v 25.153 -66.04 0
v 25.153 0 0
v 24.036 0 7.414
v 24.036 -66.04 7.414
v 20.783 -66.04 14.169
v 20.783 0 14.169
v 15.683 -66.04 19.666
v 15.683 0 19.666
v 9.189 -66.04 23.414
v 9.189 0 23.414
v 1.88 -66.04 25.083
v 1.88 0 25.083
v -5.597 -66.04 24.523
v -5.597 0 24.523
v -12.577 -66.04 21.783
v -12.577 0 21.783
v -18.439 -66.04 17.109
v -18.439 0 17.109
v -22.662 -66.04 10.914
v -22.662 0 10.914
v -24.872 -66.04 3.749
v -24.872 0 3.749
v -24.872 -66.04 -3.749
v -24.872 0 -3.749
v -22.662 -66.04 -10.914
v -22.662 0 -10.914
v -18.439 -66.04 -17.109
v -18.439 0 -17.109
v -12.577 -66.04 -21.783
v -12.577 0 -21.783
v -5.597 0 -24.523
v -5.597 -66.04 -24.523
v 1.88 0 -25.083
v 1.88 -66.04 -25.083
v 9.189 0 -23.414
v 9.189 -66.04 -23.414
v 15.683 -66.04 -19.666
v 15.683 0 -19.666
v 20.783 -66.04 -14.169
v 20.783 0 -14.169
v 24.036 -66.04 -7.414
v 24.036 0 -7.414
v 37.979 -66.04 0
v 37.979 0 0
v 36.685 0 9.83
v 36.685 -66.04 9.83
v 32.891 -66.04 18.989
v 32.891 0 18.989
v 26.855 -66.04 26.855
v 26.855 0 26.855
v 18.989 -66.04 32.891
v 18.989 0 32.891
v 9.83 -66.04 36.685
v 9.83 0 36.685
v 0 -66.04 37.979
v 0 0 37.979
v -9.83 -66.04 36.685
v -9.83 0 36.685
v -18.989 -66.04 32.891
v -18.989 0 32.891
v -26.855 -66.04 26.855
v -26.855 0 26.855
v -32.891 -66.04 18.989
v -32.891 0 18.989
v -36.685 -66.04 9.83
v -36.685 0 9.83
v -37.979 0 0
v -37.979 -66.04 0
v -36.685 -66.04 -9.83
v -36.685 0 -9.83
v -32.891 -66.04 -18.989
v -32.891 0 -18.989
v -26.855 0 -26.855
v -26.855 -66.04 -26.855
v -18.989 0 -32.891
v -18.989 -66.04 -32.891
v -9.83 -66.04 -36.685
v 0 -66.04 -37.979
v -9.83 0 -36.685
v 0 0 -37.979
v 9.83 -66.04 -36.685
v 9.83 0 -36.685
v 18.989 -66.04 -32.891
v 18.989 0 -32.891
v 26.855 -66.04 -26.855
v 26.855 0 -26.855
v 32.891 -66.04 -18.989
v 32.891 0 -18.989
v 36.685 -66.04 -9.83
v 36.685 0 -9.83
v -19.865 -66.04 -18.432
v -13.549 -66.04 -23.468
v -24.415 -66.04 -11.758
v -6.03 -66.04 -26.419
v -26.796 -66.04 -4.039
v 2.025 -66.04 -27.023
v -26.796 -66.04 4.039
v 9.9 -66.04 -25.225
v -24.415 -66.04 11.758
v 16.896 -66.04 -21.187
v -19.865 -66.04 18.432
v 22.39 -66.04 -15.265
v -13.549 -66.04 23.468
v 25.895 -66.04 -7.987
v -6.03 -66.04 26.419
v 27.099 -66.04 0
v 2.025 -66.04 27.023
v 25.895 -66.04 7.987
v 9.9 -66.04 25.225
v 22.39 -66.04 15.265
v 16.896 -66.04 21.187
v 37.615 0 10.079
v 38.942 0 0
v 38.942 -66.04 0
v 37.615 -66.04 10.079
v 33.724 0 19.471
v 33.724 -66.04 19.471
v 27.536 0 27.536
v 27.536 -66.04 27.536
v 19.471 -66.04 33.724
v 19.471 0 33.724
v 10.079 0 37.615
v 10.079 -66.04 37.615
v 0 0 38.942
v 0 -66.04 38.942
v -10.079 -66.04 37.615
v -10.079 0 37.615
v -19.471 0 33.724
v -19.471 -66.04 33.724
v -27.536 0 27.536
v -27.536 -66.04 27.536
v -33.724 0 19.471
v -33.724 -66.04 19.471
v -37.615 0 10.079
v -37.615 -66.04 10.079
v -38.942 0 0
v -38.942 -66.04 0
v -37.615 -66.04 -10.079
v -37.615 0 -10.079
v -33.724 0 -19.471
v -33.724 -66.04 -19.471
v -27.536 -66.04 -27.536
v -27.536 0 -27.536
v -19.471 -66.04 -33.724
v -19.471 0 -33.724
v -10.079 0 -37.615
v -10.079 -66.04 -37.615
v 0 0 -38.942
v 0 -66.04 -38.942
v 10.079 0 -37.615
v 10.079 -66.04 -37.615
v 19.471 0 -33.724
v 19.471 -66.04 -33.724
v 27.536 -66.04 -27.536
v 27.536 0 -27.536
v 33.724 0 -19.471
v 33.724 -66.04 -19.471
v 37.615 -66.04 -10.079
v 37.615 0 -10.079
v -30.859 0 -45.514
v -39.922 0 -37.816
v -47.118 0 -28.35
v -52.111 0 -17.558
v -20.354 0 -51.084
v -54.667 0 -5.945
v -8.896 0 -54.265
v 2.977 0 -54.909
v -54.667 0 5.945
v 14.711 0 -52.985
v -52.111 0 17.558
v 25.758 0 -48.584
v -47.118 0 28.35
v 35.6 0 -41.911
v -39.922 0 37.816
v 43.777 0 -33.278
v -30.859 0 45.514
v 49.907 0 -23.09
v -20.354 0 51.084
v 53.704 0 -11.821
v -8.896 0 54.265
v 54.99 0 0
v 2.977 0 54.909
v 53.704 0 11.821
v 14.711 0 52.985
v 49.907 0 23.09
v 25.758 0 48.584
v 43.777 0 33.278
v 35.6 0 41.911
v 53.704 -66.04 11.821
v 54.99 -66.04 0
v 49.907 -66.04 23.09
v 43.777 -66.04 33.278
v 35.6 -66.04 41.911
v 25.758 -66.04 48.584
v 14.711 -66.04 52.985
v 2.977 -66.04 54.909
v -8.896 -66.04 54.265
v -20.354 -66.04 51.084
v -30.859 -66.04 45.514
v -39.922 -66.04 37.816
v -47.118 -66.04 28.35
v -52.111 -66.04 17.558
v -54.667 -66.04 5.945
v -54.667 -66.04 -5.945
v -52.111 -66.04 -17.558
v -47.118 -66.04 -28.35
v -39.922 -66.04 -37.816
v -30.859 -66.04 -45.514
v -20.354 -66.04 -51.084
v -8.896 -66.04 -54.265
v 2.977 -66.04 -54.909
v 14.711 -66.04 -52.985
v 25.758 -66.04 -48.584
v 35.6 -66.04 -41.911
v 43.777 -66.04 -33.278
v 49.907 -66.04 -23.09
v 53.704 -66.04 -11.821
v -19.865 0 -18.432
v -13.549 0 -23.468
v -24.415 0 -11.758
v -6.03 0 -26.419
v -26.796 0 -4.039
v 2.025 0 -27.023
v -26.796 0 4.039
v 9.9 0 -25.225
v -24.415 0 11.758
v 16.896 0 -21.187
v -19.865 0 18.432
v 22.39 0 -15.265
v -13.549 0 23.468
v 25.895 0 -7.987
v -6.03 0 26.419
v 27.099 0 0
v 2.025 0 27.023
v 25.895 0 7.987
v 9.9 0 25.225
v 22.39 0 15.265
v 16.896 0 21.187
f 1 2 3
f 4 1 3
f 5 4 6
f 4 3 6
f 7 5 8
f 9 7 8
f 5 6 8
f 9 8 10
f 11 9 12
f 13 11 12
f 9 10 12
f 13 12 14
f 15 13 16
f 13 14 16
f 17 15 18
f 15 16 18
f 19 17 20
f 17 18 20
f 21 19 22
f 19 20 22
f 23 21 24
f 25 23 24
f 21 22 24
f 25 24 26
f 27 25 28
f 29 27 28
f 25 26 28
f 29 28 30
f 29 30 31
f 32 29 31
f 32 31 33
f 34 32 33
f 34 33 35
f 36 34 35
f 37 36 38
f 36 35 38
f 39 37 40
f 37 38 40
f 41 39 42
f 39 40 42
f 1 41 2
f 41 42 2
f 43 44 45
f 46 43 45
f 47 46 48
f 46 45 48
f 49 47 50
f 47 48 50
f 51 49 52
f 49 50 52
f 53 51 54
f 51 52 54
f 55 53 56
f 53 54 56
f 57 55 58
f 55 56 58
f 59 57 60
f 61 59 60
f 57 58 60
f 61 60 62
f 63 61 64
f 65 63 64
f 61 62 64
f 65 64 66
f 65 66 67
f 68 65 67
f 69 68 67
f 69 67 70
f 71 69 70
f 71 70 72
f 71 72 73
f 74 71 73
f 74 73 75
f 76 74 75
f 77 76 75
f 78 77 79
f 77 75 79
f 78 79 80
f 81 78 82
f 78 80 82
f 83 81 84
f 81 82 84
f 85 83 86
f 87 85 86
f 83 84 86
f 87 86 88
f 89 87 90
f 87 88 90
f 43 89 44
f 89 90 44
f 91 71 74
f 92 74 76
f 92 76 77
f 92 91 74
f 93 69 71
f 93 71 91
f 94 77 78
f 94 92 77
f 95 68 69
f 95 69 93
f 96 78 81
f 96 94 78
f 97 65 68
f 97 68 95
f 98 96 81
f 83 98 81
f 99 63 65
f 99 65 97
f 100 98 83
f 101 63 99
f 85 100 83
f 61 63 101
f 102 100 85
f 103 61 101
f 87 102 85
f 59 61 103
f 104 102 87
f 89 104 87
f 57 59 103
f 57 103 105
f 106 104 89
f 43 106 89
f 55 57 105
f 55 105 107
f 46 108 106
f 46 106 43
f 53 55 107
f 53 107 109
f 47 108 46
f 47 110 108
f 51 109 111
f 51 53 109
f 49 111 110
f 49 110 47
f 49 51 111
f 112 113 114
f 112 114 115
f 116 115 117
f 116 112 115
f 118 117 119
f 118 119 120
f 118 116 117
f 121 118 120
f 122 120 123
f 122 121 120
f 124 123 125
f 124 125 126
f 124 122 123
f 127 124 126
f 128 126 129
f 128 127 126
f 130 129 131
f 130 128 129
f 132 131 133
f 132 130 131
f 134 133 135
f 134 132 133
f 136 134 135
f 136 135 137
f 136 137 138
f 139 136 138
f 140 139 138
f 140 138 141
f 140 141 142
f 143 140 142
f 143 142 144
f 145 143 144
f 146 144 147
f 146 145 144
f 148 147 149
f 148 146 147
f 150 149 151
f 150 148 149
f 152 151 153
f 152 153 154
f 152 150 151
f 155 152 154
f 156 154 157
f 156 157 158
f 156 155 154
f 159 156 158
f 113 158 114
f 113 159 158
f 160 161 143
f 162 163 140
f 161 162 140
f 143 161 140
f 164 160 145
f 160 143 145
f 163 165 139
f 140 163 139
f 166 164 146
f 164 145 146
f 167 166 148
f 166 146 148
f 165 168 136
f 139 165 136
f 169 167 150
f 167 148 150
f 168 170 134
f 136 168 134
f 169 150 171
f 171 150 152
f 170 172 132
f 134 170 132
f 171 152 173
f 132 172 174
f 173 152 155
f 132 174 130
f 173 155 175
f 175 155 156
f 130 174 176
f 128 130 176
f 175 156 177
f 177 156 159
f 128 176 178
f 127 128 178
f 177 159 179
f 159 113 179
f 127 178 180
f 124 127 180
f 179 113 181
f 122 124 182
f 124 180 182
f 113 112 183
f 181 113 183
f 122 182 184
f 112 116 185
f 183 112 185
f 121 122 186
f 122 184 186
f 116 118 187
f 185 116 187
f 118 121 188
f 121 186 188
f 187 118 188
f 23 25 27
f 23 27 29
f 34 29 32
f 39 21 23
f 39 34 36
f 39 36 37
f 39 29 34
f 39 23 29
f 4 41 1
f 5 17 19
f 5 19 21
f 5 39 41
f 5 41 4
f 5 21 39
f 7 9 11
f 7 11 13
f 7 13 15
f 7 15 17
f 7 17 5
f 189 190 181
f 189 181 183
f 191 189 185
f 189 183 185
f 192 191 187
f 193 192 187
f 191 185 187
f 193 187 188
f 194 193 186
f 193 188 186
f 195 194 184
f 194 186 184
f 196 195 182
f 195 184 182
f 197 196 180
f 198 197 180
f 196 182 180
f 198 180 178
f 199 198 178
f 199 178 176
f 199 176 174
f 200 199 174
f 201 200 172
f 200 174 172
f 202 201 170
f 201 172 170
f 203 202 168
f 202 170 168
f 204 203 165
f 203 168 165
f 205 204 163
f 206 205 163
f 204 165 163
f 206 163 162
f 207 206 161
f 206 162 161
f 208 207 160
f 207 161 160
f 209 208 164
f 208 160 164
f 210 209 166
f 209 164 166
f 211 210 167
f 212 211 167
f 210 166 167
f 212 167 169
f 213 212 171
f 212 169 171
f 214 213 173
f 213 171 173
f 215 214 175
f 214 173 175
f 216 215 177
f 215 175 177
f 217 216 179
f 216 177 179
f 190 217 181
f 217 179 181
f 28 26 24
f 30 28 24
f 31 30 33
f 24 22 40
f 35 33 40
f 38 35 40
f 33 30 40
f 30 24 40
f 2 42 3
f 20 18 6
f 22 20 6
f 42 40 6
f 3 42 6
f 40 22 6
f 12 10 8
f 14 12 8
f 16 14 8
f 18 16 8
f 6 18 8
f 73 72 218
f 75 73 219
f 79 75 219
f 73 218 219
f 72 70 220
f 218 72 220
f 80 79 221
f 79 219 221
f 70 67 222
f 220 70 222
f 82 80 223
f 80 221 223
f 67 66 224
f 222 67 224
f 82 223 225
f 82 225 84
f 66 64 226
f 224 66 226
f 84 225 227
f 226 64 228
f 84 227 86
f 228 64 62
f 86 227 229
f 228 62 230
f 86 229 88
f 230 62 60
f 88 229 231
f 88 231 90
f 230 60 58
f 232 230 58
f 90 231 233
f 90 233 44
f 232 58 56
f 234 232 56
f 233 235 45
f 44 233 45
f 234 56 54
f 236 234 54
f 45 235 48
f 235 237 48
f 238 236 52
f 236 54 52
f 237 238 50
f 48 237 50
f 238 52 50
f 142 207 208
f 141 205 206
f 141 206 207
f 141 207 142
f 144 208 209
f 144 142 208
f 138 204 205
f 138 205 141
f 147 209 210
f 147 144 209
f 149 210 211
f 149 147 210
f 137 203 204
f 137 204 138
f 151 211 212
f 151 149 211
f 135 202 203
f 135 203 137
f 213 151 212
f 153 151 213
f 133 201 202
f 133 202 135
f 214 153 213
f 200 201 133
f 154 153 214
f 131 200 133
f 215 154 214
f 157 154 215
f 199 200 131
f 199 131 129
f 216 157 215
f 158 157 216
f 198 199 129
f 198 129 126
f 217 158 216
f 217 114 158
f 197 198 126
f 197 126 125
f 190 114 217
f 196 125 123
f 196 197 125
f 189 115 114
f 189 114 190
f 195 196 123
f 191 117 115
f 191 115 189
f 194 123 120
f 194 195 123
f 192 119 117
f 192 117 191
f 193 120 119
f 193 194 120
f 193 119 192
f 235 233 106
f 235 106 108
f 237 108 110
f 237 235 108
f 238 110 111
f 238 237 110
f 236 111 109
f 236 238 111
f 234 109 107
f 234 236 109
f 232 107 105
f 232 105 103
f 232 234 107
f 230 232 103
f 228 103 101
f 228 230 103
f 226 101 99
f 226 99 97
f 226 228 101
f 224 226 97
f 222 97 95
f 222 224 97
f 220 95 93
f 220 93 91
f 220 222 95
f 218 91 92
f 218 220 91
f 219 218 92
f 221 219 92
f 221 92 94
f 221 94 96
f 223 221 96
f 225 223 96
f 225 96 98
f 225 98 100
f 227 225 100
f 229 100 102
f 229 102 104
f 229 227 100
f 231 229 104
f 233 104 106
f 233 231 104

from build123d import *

# Parameters (mm, degrees)
F0_R     = 54.989641
F0_R_2   = 38.94163
F0_R_3   = 37.978864
F0_R_4   = 27.098671
F0_R_5   = 25.15318
F1_DEPTH = 66.04


with BuildPart() as f1:
    # F0 (on Front) → F1 (new body)
    with BuildSketch(Plane.XZ):
        Circle(F0_R)
        Circle(F0_R_2, mode=Mode.SUBTRACT)
        Circle(F0_R_3)
        Circle(F0_R_4, mode=Mode.SUBTRACT)
        Circle(F0_R_5)
    extrude(amount=F1_DEPTH)


solid = f1.part
